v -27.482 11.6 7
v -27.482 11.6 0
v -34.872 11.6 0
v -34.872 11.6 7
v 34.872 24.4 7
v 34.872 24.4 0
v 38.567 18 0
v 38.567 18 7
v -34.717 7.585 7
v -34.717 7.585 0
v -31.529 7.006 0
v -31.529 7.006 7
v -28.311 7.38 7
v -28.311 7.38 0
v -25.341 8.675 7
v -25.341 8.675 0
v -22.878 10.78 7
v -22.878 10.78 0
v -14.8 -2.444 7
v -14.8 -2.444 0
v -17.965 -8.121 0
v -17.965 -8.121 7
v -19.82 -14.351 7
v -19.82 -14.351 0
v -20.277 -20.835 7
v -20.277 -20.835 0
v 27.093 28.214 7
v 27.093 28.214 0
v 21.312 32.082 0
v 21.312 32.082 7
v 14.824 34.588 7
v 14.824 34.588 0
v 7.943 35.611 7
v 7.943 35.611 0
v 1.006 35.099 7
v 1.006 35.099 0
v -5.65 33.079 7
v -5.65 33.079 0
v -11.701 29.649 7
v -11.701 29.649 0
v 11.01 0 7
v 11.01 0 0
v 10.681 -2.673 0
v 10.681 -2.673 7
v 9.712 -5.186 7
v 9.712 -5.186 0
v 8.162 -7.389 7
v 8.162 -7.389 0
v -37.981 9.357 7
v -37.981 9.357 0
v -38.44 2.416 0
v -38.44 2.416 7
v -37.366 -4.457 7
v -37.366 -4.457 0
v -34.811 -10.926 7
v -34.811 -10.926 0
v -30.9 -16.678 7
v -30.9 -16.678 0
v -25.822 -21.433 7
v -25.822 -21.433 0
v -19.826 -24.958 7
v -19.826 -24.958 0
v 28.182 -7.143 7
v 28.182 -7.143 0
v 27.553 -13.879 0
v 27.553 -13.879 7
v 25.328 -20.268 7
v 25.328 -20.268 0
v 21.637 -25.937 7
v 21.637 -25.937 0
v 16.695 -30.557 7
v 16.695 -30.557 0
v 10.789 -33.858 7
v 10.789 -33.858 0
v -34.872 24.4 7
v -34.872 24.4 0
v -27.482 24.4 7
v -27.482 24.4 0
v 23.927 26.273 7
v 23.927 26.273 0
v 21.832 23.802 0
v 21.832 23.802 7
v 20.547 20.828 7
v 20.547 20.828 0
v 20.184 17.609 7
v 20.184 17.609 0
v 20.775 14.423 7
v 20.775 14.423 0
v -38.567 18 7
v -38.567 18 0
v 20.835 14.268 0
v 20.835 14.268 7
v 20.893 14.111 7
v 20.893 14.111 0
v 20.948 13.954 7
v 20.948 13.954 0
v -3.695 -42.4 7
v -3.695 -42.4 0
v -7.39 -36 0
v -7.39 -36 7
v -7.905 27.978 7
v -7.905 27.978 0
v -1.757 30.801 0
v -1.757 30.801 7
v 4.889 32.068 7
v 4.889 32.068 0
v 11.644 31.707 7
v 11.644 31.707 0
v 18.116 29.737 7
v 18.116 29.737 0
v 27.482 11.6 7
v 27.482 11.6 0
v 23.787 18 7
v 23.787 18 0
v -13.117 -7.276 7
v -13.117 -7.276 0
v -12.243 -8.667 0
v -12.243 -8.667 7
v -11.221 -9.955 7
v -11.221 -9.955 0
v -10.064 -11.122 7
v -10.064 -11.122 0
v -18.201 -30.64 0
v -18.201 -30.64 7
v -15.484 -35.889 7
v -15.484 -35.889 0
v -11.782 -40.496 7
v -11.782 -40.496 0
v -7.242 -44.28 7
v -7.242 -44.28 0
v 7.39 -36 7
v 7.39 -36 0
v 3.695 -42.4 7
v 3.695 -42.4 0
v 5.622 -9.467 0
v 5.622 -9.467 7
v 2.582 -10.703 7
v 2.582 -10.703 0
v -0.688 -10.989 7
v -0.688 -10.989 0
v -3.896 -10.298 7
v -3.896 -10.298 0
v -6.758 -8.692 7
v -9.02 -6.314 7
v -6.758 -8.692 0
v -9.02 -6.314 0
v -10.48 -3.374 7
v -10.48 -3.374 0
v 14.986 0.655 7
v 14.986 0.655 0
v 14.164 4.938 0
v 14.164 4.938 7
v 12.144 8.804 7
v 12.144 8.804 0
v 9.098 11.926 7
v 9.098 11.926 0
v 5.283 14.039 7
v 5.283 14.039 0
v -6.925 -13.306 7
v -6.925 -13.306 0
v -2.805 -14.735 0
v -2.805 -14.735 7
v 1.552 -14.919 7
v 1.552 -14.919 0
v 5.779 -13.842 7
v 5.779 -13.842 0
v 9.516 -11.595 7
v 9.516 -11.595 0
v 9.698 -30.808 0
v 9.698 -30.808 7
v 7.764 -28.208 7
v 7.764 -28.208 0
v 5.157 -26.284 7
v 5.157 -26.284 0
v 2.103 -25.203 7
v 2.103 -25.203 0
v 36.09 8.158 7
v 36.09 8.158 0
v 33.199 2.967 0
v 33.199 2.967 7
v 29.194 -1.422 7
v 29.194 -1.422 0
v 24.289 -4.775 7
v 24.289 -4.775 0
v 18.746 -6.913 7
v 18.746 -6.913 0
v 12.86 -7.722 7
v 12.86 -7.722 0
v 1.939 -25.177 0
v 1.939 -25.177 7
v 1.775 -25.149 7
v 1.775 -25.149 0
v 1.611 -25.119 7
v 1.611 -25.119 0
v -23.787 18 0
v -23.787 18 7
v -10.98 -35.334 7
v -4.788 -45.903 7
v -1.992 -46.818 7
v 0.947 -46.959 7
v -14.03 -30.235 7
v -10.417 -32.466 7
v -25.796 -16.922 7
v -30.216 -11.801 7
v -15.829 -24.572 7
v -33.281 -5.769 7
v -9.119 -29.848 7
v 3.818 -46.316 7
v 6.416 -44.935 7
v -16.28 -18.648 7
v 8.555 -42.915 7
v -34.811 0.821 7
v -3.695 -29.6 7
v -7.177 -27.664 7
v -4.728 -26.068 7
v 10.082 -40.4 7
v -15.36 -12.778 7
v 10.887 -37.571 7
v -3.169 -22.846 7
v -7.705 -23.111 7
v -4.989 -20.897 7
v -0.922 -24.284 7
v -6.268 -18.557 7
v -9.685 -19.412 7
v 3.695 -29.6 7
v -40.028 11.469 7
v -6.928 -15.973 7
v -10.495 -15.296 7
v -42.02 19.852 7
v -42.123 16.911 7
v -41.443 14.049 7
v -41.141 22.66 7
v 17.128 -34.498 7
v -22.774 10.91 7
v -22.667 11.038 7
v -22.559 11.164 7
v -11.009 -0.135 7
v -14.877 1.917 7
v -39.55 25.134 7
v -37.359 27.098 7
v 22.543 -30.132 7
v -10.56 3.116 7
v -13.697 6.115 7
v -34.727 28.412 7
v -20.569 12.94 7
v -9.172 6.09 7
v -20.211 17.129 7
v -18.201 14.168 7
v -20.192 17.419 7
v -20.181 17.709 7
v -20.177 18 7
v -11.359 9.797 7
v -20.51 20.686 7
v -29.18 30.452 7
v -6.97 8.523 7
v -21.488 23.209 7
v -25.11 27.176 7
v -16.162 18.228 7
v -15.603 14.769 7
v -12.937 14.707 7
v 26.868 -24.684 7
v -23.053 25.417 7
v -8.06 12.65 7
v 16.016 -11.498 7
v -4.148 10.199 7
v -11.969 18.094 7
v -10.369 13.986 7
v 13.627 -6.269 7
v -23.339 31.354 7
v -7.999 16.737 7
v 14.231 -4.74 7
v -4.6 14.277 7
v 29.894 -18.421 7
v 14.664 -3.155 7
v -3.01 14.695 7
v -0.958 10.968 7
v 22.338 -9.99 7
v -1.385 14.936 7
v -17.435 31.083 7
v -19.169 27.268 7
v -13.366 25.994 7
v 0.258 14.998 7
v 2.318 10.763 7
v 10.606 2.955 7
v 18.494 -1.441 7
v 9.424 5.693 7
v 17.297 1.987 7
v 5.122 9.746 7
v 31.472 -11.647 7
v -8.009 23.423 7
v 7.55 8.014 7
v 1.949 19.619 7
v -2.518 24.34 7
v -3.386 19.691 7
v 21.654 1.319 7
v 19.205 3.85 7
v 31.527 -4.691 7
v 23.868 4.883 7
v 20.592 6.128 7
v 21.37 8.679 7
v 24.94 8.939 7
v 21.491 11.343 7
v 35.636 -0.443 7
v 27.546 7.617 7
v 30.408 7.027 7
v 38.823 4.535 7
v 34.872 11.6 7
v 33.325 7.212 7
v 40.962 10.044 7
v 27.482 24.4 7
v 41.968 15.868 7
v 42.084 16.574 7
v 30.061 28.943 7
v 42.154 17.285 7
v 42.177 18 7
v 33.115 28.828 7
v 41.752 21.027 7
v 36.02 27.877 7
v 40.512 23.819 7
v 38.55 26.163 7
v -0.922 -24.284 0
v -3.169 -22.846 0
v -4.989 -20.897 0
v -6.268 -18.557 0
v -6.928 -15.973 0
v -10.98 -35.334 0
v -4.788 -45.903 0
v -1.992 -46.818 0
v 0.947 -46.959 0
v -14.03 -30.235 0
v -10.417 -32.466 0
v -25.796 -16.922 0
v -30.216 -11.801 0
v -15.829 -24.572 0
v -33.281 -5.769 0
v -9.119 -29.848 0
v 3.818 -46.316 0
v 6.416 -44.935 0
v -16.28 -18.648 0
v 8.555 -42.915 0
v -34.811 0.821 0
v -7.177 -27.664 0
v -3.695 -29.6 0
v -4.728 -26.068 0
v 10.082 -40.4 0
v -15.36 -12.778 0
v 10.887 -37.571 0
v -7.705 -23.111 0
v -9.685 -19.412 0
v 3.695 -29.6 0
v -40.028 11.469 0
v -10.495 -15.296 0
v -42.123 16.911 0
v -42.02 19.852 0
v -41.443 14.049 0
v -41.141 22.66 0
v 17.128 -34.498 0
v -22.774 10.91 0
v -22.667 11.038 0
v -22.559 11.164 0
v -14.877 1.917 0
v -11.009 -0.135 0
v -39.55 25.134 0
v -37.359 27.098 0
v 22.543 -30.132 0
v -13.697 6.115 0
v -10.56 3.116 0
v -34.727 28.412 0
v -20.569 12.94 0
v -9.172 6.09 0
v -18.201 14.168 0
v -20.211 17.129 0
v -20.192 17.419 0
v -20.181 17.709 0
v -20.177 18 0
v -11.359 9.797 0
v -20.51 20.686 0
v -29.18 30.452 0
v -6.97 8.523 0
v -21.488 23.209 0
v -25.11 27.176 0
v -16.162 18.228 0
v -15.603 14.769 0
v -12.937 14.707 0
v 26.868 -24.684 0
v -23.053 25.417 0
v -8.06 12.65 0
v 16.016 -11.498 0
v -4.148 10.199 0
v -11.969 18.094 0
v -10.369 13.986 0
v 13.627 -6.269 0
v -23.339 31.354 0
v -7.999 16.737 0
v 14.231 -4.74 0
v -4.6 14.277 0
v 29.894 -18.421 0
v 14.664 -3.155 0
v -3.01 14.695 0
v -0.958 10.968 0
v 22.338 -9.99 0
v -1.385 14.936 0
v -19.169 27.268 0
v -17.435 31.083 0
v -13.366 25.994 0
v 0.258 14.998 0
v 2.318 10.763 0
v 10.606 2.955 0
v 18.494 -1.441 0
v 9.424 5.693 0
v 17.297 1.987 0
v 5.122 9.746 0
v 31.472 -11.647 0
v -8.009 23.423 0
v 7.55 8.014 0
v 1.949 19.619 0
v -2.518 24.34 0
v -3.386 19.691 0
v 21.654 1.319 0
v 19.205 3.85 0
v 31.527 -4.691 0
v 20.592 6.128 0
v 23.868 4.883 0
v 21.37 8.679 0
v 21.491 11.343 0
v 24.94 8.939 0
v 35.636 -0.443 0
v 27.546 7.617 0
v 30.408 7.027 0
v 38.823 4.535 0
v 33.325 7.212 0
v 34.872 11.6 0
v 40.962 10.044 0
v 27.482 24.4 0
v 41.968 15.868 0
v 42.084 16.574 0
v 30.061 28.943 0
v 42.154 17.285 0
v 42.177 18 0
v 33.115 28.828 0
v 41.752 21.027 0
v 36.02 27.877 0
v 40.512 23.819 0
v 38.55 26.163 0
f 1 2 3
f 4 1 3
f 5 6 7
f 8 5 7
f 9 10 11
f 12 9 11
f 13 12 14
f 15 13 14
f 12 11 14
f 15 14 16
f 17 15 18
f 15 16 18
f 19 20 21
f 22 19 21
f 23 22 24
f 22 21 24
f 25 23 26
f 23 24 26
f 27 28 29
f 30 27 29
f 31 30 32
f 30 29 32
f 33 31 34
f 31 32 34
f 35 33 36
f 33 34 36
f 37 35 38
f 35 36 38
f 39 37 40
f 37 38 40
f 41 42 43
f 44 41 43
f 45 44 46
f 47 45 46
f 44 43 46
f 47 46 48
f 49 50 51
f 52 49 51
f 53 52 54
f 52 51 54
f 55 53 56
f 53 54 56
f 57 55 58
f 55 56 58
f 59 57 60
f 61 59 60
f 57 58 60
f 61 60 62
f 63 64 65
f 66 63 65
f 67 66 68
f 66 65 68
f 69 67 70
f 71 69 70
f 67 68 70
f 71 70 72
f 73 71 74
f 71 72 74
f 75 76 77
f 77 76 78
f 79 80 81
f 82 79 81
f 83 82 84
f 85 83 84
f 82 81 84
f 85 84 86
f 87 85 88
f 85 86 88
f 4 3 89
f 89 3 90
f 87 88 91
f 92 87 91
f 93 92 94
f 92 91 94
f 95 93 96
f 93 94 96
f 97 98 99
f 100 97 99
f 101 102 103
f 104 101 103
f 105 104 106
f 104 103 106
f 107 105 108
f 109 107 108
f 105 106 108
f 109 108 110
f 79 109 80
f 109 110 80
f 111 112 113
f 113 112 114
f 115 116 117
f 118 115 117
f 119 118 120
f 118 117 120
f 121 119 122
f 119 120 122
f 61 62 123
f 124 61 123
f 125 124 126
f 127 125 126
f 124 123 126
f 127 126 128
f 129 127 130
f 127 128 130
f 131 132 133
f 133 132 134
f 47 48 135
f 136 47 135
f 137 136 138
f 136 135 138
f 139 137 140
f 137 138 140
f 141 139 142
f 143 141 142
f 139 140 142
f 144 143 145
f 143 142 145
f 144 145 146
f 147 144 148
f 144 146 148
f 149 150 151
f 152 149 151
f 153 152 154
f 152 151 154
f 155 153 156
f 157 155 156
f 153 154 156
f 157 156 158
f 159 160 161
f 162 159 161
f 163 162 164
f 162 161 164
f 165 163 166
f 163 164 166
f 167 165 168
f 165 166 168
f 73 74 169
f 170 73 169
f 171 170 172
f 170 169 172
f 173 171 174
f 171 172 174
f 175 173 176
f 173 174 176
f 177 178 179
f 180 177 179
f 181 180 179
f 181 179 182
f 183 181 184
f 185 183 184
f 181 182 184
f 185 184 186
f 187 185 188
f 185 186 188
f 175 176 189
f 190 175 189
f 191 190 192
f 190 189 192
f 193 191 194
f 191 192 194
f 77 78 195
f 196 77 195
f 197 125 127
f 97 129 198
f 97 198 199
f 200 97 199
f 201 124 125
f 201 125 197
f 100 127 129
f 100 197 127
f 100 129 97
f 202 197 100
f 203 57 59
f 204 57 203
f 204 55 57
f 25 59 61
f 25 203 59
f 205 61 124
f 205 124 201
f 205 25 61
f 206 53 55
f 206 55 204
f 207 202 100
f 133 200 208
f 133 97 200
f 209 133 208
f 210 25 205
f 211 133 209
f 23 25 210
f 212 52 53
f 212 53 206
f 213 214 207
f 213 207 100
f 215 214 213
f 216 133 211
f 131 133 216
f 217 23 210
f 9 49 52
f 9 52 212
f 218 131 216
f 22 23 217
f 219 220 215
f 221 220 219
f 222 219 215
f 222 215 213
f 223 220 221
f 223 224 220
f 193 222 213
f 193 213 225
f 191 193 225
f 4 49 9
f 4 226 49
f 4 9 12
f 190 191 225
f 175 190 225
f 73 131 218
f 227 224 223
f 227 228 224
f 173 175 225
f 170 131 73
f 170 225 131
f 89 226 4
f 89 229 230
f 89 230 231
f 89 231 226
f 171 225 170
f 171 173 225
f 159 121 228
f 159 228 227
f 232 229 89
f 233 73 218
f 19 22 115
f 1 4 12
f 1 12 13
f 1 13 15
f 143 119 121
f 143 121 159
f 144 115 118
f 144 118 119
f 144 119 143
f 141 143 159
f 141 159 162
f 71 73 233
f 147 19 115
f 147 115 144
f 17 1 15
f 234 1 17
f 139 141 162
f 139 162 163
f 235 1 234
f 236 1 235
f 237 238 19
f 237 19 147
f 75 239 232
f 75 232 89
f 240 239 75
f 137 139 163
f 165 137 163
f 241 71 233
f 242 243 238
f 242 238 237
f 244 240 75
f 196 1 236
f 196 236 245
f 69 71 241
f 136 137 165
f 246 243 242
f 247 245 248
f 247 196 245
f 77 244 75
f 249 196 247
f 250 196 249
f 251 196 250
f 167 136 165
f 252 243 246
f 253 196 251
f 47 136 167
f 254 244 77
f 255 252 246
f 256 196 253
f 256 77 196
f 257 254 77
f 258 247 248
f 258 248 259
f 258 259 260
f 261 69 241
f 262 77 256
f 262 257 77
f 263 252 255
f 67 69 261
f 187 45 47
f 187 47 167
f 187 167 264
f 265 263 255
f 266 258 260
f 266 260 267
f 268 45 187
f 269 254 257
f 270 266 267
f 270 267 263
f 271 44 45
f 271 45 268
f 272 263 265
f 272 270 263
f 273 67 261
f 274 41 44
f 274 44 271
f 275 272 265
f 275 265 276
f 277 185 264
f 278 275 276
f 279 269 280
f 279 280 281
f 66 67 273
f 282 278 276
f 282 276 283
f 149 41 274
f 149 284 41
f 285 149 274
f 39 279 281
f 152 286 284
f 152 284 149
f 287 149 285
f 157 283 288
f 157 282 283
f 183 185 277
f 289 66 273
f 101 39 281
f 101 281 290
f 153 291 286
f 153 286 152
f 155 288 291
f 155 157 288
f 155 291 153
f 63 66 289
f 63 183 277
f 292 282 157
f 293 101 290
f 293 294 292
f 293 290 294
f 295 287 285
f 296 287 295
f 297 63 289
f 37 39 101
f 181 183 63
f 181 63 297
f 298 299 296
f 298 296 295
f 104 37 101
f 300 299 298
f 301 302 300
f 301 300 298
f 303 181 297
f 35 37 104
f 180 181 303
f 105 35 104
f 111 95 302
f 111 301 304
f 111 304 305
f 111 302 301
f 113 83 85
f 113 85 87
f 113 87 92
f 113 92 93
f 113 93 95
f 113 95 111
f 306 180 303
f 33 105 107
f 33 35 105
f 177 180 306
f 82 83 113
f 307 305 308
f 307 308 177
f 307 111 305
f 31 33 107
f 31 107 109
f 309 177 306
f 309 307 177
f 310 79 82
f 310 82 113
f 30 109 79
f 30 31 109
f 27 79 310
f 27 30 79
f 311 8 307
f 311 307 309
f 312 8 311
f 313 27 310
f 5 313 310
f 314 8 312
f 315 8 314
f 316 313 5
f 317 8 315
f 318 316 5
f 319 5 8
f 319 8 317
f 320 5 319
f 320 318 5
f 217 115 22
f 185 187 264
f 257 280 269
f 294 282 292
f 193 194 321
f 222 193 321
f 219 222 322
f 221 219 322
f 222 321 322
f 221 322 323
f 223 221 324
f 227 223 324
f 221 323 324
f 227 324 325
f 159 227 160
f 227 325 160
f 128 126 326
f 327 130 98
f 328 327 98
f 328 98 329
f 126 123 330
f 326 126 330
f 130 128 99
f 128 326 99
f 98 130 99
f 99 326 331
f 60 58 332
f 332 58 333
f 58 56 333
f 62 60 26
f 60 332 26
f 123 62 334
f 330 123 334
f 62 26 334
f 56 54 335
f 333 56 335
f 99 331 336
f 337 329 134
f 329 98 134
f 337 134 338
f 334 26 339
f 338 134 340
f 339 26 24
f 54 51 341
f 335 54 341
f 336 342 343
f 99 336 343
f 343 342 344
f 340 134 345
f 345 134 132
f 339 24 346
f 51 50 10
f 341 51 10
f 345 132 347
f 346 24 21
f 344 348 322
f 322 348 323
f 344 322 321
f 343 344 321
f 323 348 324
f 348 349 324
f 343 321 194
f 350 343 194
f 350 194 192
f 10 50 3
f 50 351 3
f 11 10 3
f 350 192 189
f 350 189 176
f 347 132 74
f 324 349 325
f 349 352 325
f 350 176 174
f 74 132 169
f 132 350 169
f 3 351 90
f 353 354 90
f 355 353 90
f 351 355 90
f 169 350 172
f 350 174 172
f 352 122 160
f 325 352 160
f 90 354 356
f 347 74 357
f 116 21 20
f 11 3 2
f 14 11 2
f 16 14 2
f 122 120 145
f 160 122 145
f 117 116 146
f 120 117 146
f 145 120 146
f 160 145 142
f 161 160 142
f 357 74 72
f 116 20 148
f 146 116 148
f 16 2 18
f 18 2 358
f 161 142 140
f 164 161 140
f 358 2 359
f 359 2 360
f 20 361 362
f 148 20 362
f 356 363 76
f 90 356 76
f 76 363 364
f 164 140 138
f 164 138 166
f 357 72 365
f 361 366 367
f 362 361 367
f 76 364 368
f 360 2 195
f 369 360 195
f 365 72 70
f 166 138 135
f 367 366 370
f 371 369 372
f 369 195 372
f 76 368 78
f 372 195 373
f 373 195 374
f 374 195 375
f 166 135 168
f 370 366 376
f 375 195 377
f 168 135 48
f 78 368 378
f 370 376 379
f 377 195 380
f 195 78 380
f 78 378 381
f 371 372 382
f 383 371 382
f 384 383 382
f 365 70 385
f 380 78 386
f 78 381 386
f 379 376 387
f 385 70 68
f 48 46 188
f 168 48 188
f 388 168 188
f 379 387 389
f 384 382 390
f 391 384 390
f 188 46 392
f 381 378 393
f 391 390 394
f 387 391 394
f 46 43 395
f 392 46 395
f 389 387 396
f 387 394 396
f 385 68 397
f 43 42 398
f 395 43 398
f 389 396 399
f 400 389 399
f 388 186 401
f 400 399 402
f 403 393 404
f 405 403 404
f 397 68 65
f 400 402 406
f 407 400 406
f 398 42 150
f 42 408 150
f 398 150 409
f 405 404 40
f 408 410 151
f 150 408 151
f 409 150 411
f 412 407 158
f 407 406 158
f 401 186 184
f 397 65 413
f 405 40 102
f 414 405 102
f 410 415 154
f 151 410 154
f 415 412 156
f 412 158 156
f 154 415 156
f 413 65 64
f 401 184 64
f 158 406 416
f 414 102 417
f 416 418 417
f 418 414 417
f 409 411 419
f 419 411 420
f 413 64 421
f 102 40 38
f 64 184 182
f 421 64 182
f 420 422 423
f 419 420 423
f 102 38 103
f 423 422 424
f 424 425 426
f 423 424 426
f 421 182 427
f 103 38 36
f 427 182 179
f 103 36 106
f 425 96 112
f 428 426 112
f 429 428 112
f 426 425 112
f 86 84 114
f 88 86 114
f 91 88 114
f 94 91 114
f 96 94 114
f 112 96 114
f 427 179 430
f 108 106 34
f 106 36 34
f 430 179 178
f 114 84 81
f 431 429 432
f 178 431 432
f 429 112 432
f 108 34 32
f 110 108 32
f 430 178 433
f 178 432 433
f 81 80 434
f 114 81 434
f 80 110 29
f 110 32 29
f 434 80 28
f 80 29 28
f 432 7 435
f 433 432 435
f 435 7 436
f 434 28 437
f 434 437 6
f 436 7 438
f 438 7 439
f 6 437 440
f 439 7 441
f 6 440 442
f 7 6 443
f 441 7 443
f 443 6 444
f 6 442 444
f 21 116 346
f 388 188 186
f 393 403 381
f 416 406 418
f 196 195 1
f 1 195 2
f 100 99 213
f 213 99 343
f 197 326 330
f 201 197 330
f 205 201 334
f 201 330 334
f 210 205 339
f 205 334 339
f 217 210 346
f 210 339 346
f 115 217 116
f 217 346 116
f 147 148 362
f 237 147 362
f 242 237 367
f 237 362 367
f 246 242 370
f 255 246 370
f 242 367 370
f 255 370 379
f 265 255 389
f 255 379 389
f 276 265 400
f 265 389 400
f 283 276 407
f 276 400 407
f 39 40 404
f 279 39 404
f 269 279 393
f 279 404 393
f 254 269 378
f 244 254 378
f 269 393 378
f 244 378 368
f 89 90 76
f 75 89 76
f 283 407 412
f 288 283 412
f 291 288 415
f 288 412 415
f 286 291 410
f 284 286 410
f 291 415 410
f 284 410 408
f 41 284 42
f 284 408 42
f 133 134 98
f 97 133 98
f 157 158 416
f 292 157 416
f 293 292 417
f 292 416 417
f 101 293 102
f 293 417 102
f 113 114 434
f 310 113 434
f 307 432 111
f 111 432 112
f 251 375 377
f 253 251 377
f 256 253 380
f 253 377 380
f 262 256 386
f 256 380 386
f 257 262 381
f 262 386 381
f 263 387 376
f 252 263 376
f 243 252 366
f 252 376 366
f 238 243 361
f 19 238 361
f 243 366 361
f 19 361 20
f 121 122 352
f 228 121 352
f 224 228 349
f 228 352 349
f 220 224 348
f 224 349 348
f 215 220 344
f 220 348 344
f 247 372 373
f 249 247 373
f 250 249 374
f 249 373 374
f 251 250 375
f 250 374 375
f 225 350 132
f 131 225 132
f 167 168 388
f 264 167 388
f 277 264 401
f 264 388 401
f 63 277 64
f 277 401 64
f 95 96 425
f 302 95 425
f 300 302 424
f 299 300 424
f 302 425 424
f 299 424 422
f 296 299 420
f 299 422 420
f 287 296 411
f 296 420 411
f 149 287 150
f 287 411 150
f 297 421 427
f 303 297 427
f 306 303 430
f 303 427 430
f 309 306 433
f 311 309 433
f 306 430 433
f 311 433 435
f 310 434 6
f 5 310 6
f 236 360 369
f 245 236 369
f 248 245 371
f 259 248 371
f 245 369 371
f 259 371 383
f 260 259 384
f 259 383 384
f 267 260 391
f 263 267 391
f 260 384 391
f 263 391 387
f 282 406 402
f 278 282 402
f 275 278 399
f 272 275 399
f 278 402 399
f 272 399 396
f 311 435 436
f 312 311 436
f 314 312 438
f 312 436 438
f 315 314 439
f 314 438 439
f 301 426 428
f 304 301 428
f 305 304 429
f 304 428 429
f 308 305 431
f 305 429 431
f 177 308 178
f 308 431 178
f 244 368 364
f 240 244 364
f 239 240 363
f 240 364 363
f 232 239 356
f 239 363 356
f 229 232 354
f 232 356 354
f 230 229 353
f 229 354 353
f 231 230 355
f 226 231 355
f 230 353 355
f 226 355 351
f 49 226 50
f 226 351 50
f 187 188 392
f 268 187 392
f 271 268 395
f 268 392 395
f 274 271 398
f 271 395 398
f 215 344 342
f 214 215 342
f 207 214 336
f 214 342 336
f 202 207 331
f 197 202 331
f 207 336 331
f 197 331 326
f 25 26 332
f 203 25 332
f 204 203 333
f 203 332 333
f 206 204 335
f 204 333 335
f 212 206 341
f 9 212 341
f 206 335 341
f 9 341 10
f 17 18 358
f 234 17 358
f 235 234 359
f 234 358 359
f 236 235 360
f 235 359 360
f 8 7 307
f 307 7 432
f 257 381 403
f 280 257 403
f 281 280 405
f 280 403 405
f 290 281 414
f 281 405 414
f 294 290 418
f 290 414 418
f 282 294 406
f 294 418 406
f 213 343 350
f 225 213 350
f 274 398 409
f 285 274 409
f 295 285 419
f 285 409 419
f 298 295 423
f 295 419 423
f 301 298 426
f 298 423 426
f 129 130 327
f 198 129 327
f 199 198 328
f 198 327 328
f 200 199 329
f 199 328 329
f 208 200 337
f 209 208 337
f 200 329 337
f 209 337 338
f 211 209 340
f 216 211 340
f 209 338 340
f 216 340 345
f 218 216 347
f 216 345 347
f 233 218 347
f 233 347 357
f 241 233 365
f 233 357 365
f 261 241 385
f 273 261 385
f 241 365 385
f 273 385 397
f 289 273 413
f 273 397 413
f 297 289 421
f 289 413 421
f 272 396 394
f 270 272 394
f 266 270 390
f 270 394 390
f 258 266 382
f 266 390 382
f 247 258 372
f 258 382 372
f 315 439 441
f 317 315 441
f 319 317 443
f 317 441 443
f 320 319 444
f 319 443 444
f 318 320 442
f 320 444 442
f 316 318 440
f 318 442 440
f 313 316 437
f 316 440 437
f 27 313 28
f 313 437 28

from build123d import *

# Parameters (mm, degrees)
F1_DEPTH = 7


with BuildPart() as f1:
    # F0 (on Top) → F1 (new body)
    with BuildSketch(Plane.XY):
        with BuildLine():
            ThreePointArc((-20.1769145362, 18), (-21.488385021, 23.2088766383), (-25.110077415, 27.1757009184))
            ThreePointArc((-25.110077415, 27.1757009184), (-29.7748571992, 28.9102811707), (-34.7266408906, 28.4115053095))
            ThreePointArc((-34.7266408906, 28.4115053095), (-42.0199383865, 19.8517110421), (-37.9807286986, 9.3566145033))
            ThreePointArc((-37.9807286986, 9.3566145033), (-36.4240480944, 8.3321362534), (-34.7167699787, 7.585134497))
            ThreePointArc((-34.7167699787, 7.585134497), (-28.3109335724, 7.379917462), (-22.878035033, 10.7799862195))
            ThreePointArc((-22.878035033, 10.7799862195), (-22.7206495749, 10.9739866522), (-22.5587647959, 11.1642487573))
            ThreePointArc((-22.5587647959, 11.1642487573), (-20.9409937058, 13.9718583996), (-20.2114514306, 17.1290126994))
            ThreePointArc((-20.2114514306, 17.1290126994), (-20.1855521511, 17.5641641149), (-20.1769145362, 18))
        make_face()
        Polygon((-27.4818728134, 24.4), (-23.7868310906, 18), (-27.4818728134, 11.6), (-34.8719562591, 11.6), (-38.5669979819, 18), (-34.8719562591, 24.4), align=None, mode=Mode.SUBTRACT)
        with BuildLine():
            ThreePointArc((-25.110077415, 27.1757009184), (-10.6130898996, 24.8635046125), (0.2578098611, 14.9977843055))
            ThreePointArc((0.2578098611, 14.9977843055), (2.8117454732, 14.7341130508), (5.2833018212, 14.0387578463))
            ThreePointArc((5.2833018212, 14.0387578463), (-0.1548013079, 22.1020653498), (-7.9047923881, 27.9780786067))
            ThreePointArc((-7.9047923881, 27.9780786067), (-9.7736896067, 28.8795995701), (-11.7009340456, 29.6485246209))
            ThreePointArc((-11.7009340456, 29.6485246209), (-23.3386442583, 31.3540820363), (-34.7266408906, 28.4115053095))
            ThreePointArc((-34.7266408906, 28.4115053095), (-29.7748571992, 28.9102811707), (-25.110077415, 27.1757009184))
        make_face()
        with BuildLine():
            ThreePointArc((-10.4801536135, -3.3743859051), (-8.1623807228, 7.3888863123), (2.3177728907, 10.7632722175))
            ThreePointArc((2.3177728907, 10.7632722175), (1.3849026925, 12.9277700022), (0.2578098611, 14.9977843055))
            ThreePointArc((0.2578098611, 14.9977843055), (-2.2008314196, 14.8376662943), (-4.6000937333, 14.2772244377))
            ThreePointArc((-4.6000937333, 14.2772244377), (-6.3822716771, 13.5744837191), (-8.0603476006, 12.6503279229))
            ThreePointArc((-8.0603476006, 12.6503279229), (-13.6968225738, 6.1153128606), (-14.799571843, -2.4439053302))
            ThreePointArc((-14.799571843, -2.4439053302), (-14.1659889408, -4.9320135166), (-13.1173671396, -7.2756222638))
            ThreePointArc((-13.1173671396, -7.2756222638), (-11.8882285824, -5.2645240876), (-10.4801536135, -3.3743859051))
        make_face()
        with BuildLine():
            ThreePointArc((2.3177728907, 10.7632722175), (8.565593369, 6.9174207792), (11.01, 0))
            ThreePointArc((11.01, 0), (10.273458808, -3.9593110665), (8.1623807228, -7.3888863123))
            ThreePointArc((8.1623807228, -7.3888863123), (10.5033258899, -7.6632459146), (12.8595572786, -7.7221620418))
            ThreePointArc((12.8595572786, -7.7221620418), (13.9502116536, -5.5128572283), (14.6644859253, -3.154814186))
            ThreePointArc((14.6644859253, -3.154814186), (14.9158856405, -1.5863024808), (15, 0))
            ThreePointArc((15, 0), (14.9964193596, 0.327729144), (14.9856791478, 0.655301824))
            ThreePointArc((14.9856791478, 0.655301824), (12.1444275762, 8.8041398697), (5.2833018212, 14.0387578463))
            ThreePointArc((5.2833018212, 14.0387578463), (2.8117454732, 14.7341130508), (0.2578098611, 14.9977843055))
            ThreePointArc((0.2578098611, 14.9977843055), (1.3849026925, 12.9277700022), (2.3177728907, 10.7632722175))
        make_face()
        with BuildLine():
            ThreePointArc((12.8595572786, -7.7221620418), (10.5033258899, -7.6632459146), (8.1623807228, -7.3888863123))
            ThreePointArc((8.1623807228, -7.3888863123), (-2.3177728907, -10.7632722175), (-10.4801536135, -3.3743859051))
            ThreePointArc((-10.4801536135, -3.3743859051), (-11.8882285824, -5.2645240876), (-13.1173671396, -7.2756222638))
            ThreePointArc((-13.1173671396, -7.2756222638), (-11.749380234, -9.324809066), (-10.0643921919, -11.1224102517))
            ThreePointArc((-10.0643921919, -11.1224102517), (-8.5647119055, -12.3144512657), (-6.9253315472, -13.3056297469))
            ThreePointArc((-6.9253315472, -13.3056297469), (1.5523949975, -14.9194527303), (9.5162700219, -11.5948525161))
            ThreePointArc((9.5162700219, -11.5948525161), (11.3542434676, -9.8020995342), (12.8595572786, -7.7221620418))
        make_face()
        with BuildLine():
            ThreePointArc((-10.9798086535, -35.3338153916), (-16.2258816717, -21.6229577719), (-13.1173671396, -7.2756222638))
            ThreePointArc((-13.1173671396, -7.2756222638), (-14.1659889408, -4.9320135166), (-14.799571843, -2.4439053302))
            ThreePointArc((-14.799571843, -2.4439053302), (-19.0635494151, -11.1850945401), (-20.2773306285, -20.8347903231))
            ThreePointArc((-20.2773306285, -20.8347903231), (-20.1236220755, -22.9040632731), (-19.8259084836, -24.957568442))
            ThreePointArc((-19.8259084836, -24.957568442), (-15.4841094266, -35.8888998357), (-7.2417649124, -44.2799058541))
            ThreePointArc((-7.2417649124, -44.2799058541), (-10.1496093248, -40.2409233139), (-10.9798086535, -35.3338153916))
        make_face()
        with BuildLine():
            ThreePointArc((-8.0603476006, 12.6503279229), (-6.3822716771, 13.5744837191), (-4.6000937333, 14.2772244377))
            ThreePointArc((-4.6000937333, 14.2772244377), (-11.9690338946, 18.0939285598), (-20.2114514306, 17.1290126994))
            ThreePointArc((-20.2114514306, 17.1290126994), (-20.9409937058, 13.9718583996), (-22.5587647959, 11.1642487573))
            ThreePointArc((-22.5587647959, 11.1642487573), (-15.6028763872, 14.7689652749), (-8.0603476006, 12.6503279229))
        make_face()
        with BuildLine():
            ThreePointArc((36.0898860685, 8.1581144732), (26.8389715713, -3.2405468406), (12.8595572786, -7.7221620418))
            ThreePointArc((12.8595572786, -7.7221620418), (11.3542434676, -9.8020995342), (9.5162700219, -11.5948525161))
            ThreePointArc((9.5162700219, -11.5948525161), (19.218350723, -10.9169708097), (28.1821230165, -7.1432882836))
            ThreePointArc((28.1821230165, -7.1432882836), (29.8973116822, -5.9755362969), (31.5268425292, -4.6909561789))
            ThreePointArc((31.5268425292, -4.6909561789), (38.8227536849, 4.5348177995), (41.9684058031, 15.8684005447))
            ThreePointArc((41.9684058031, 15.8684005447), (39.924466524, 11.3306421432), (36.0898860685, 8.1581144732))
        make_face()
        with BuildLine():
            ThreePointArc((24.9398858547, 8.9391240365), (30.4082951127, 7.0268863042), (36.0898860685, 8.1581144732))
            ThreePointArc((36.0898860685, 8.1581144732), (39.924466524, 11.3306421432), (41.9684058031, 15.8684005447))
            ThreePointArc((41.9684058031, 15.8684005447), (42.1246632531, 16.9291134362), (42.1769145362, 18))
            ThreePointArc((42.1769145362, 18), (37.3446399002, 27.1081921277), (27.0934302026, 28.2139686556))
            ThreePointArc((27.0934302026, 28.2139686556), (25.4278657104, 27.3780828317), (23.9273041549, 26.2730374904))
            ThreePointArc((23.9273041549, 26.2730374904), (20.5466627861, 20.8280289476), (20.774759435, 14.4229664175))
            ThreePointArc((20.774759435, 14.4229664175), (20.8640760091, 14.1896663962), (20.9479054359, 13.9543390126))
            ThreePointArc((20.9479054359, 13.9543390126), (22.570481165, 11.1495033299), (24.9398858547, 8.9391240365))
        make_face()
        Polygon((34.8719562591, 24.4), (38.5669979819, 18), (34.8719562591, 11.6), (27.4818728134, 11.6), (23.7868310906, 18), (27.4818728134, 24.4), align=None, mode=Mode.SUBTRACT)
        with BuildLine():
            ThreePointArc((-4.7284344241, -26.0681367359), (-9.1186855075, -29.8477992055), (-10.9798086535, -35.3338153916))
            ThreePointArc((-10.9798086535, -35.3338153916), (-10.1496093248, -40.2409233139), (-7.2417649124, -44.2799058541))
            ThreePointArc((-7.2417649124, -44.2799058541), (3.8178831222, -46.3161896292), (10.887298496, -37.5705831589))
            ThreePointArc((10.887298496, -37.5705831589), (10.9717884471, -36.7873107849), (11, -36))
            ThreePointArc((11, -36), (10.9472399275, -34.9239247384), (10.7894658239, -33.8581719874))
            ThreePointArc((10.7894658239, -33.8581719874), (7.7642707863, -28.2079464095), (2.1032755979, -25.202952637))
            ThreePointArc((2.1032755979, -25.202952637), (1.8565735658, -25.1636530484), (1.61085936, -25.1185877699))
            ThreePointArc((1.61085936, -25.1185877699), (-1.6294874593, -25.1213617295), (-4.7284344241, -26.0681367359))
        make_face()
        Polygon((3.6950417228, -42.4), (-3.6950417228, -42.4), (-7.3900834456, -36), (-3.6950417228, -29.6), (3.6950417228, -29.6), (7.3900834456, -36), align=None, mode=Mode.SUBTRACT)
        with BuildLine():
            ThreePointArc((15, 0), (14.9158856405, -1.5863024808), (14.6644859253, -3.154814186))
            ThreePointArc((14.6644859253, -3.154814186), (21.6543187343, 1.3185231315), (24.9398858547, 8.9391240365))
            ThreePointArc((24.9398858547, 8.9391240365), (22.570481165, 11.1495033299), (20.9479054359, 13.9543390126))
            ThreePointArc((20.9479054359, 13.9543390126), (20.5917373093, 6.128004686), (14.9856791478, 0.655301824))
            ThreePointArc((14.9856791478, 0.655301824), (14.9964193596, 0.327729144), (15, 0))
        make_face()
        with BuildLine():
            ThreePointArc((-6.9253315472, -13.3056297469), (-8.5647119055, -12.3144512657), (-10.0643921919, -11.1224102517))
            ThreePointArc((-10.0643921919, -11.1224102517), (-9.6852848398, -19.4124516913), (-4.7284344241, -26.0681367359))
            ThreePointArc((-4.7284344241, -26.0681367359), (-1.6294874593, -25.1213617295), (1.61085936, -25.1185877699))
            ThreePointArc((1.61085936, -25.1185877699), (-4.9888609221, -20.8969699609), (-6.9253315472, -13.3056297469))
        make_face()
        with BuildLine():
            ThreePointArc((-19.8259084836, -24.957568442), (-20.1236220755, -22.9040632731), (-20.2773306285, -20.8347903231))
            ThreePointArc((-20.2773306285, -20.8347903231), (-31.931222333, -8.87771769), (-34.7167699787, 7.585134497))
            ThreePointArc((-34.7167699787, 7.585134497), (-36.4240480944, 8.3321362534), (-37.9807286986, 9.3566145033))
            ThreePointArc((-37.9807286986, 9.3566145033), (-34.8113873846, -10.9262960202), (-19.8259084836, -24.957568442))
        make_face()
        with BuildLine():
            ThreePointArc((-11.7009340456, 29.6485246209), (-9.7736896067, 28.8795995701), (-7.9047923881, 27.9780786067))
            ThreePointArc((-7.9047923881, 27.9780786067), (8.2772821194, 32.0921085593), (23.9273041549, 26.2730374904))
            ThreePointArc((23.9273041549, 26.2730374904), (25.4278657104, 27.3780828317), (27.0934302026, 28.2139686556))
            ThreePointArc((27.0934302026, 28.2139686556), (7.9432437696, 35.6106938262), (-11.7009340456, 29.6485246209))
        make_face()
        with BuildLine():
            ThreePointArc((31.5268425292, -4.6909561789), (29.8973116822, -5.9755362969), (28.1821230165, -7.1432882836))
            ThreePointArc((28.1821230165, -7.1432882836), (23.6539402137, -23.2143908693), (10.7894658239, -33.8581719874))
            ThreePointArc((10.7894658239, -33.8581719874), (10.9472399275, -34.9239247384), (11, -36))
            ThreePointArc((11, -36), (10.9717884471, -36.7873107849), (10.887298496, -37.5705831589))
            ThreePointArc((10.887298496, -37.5705831589), (26.8681436151, -24.684397806), (31.5268425292, -4.6909561789))
        make_face()
    extrude(amount=F1_DEPTH)


solid = f1.part
